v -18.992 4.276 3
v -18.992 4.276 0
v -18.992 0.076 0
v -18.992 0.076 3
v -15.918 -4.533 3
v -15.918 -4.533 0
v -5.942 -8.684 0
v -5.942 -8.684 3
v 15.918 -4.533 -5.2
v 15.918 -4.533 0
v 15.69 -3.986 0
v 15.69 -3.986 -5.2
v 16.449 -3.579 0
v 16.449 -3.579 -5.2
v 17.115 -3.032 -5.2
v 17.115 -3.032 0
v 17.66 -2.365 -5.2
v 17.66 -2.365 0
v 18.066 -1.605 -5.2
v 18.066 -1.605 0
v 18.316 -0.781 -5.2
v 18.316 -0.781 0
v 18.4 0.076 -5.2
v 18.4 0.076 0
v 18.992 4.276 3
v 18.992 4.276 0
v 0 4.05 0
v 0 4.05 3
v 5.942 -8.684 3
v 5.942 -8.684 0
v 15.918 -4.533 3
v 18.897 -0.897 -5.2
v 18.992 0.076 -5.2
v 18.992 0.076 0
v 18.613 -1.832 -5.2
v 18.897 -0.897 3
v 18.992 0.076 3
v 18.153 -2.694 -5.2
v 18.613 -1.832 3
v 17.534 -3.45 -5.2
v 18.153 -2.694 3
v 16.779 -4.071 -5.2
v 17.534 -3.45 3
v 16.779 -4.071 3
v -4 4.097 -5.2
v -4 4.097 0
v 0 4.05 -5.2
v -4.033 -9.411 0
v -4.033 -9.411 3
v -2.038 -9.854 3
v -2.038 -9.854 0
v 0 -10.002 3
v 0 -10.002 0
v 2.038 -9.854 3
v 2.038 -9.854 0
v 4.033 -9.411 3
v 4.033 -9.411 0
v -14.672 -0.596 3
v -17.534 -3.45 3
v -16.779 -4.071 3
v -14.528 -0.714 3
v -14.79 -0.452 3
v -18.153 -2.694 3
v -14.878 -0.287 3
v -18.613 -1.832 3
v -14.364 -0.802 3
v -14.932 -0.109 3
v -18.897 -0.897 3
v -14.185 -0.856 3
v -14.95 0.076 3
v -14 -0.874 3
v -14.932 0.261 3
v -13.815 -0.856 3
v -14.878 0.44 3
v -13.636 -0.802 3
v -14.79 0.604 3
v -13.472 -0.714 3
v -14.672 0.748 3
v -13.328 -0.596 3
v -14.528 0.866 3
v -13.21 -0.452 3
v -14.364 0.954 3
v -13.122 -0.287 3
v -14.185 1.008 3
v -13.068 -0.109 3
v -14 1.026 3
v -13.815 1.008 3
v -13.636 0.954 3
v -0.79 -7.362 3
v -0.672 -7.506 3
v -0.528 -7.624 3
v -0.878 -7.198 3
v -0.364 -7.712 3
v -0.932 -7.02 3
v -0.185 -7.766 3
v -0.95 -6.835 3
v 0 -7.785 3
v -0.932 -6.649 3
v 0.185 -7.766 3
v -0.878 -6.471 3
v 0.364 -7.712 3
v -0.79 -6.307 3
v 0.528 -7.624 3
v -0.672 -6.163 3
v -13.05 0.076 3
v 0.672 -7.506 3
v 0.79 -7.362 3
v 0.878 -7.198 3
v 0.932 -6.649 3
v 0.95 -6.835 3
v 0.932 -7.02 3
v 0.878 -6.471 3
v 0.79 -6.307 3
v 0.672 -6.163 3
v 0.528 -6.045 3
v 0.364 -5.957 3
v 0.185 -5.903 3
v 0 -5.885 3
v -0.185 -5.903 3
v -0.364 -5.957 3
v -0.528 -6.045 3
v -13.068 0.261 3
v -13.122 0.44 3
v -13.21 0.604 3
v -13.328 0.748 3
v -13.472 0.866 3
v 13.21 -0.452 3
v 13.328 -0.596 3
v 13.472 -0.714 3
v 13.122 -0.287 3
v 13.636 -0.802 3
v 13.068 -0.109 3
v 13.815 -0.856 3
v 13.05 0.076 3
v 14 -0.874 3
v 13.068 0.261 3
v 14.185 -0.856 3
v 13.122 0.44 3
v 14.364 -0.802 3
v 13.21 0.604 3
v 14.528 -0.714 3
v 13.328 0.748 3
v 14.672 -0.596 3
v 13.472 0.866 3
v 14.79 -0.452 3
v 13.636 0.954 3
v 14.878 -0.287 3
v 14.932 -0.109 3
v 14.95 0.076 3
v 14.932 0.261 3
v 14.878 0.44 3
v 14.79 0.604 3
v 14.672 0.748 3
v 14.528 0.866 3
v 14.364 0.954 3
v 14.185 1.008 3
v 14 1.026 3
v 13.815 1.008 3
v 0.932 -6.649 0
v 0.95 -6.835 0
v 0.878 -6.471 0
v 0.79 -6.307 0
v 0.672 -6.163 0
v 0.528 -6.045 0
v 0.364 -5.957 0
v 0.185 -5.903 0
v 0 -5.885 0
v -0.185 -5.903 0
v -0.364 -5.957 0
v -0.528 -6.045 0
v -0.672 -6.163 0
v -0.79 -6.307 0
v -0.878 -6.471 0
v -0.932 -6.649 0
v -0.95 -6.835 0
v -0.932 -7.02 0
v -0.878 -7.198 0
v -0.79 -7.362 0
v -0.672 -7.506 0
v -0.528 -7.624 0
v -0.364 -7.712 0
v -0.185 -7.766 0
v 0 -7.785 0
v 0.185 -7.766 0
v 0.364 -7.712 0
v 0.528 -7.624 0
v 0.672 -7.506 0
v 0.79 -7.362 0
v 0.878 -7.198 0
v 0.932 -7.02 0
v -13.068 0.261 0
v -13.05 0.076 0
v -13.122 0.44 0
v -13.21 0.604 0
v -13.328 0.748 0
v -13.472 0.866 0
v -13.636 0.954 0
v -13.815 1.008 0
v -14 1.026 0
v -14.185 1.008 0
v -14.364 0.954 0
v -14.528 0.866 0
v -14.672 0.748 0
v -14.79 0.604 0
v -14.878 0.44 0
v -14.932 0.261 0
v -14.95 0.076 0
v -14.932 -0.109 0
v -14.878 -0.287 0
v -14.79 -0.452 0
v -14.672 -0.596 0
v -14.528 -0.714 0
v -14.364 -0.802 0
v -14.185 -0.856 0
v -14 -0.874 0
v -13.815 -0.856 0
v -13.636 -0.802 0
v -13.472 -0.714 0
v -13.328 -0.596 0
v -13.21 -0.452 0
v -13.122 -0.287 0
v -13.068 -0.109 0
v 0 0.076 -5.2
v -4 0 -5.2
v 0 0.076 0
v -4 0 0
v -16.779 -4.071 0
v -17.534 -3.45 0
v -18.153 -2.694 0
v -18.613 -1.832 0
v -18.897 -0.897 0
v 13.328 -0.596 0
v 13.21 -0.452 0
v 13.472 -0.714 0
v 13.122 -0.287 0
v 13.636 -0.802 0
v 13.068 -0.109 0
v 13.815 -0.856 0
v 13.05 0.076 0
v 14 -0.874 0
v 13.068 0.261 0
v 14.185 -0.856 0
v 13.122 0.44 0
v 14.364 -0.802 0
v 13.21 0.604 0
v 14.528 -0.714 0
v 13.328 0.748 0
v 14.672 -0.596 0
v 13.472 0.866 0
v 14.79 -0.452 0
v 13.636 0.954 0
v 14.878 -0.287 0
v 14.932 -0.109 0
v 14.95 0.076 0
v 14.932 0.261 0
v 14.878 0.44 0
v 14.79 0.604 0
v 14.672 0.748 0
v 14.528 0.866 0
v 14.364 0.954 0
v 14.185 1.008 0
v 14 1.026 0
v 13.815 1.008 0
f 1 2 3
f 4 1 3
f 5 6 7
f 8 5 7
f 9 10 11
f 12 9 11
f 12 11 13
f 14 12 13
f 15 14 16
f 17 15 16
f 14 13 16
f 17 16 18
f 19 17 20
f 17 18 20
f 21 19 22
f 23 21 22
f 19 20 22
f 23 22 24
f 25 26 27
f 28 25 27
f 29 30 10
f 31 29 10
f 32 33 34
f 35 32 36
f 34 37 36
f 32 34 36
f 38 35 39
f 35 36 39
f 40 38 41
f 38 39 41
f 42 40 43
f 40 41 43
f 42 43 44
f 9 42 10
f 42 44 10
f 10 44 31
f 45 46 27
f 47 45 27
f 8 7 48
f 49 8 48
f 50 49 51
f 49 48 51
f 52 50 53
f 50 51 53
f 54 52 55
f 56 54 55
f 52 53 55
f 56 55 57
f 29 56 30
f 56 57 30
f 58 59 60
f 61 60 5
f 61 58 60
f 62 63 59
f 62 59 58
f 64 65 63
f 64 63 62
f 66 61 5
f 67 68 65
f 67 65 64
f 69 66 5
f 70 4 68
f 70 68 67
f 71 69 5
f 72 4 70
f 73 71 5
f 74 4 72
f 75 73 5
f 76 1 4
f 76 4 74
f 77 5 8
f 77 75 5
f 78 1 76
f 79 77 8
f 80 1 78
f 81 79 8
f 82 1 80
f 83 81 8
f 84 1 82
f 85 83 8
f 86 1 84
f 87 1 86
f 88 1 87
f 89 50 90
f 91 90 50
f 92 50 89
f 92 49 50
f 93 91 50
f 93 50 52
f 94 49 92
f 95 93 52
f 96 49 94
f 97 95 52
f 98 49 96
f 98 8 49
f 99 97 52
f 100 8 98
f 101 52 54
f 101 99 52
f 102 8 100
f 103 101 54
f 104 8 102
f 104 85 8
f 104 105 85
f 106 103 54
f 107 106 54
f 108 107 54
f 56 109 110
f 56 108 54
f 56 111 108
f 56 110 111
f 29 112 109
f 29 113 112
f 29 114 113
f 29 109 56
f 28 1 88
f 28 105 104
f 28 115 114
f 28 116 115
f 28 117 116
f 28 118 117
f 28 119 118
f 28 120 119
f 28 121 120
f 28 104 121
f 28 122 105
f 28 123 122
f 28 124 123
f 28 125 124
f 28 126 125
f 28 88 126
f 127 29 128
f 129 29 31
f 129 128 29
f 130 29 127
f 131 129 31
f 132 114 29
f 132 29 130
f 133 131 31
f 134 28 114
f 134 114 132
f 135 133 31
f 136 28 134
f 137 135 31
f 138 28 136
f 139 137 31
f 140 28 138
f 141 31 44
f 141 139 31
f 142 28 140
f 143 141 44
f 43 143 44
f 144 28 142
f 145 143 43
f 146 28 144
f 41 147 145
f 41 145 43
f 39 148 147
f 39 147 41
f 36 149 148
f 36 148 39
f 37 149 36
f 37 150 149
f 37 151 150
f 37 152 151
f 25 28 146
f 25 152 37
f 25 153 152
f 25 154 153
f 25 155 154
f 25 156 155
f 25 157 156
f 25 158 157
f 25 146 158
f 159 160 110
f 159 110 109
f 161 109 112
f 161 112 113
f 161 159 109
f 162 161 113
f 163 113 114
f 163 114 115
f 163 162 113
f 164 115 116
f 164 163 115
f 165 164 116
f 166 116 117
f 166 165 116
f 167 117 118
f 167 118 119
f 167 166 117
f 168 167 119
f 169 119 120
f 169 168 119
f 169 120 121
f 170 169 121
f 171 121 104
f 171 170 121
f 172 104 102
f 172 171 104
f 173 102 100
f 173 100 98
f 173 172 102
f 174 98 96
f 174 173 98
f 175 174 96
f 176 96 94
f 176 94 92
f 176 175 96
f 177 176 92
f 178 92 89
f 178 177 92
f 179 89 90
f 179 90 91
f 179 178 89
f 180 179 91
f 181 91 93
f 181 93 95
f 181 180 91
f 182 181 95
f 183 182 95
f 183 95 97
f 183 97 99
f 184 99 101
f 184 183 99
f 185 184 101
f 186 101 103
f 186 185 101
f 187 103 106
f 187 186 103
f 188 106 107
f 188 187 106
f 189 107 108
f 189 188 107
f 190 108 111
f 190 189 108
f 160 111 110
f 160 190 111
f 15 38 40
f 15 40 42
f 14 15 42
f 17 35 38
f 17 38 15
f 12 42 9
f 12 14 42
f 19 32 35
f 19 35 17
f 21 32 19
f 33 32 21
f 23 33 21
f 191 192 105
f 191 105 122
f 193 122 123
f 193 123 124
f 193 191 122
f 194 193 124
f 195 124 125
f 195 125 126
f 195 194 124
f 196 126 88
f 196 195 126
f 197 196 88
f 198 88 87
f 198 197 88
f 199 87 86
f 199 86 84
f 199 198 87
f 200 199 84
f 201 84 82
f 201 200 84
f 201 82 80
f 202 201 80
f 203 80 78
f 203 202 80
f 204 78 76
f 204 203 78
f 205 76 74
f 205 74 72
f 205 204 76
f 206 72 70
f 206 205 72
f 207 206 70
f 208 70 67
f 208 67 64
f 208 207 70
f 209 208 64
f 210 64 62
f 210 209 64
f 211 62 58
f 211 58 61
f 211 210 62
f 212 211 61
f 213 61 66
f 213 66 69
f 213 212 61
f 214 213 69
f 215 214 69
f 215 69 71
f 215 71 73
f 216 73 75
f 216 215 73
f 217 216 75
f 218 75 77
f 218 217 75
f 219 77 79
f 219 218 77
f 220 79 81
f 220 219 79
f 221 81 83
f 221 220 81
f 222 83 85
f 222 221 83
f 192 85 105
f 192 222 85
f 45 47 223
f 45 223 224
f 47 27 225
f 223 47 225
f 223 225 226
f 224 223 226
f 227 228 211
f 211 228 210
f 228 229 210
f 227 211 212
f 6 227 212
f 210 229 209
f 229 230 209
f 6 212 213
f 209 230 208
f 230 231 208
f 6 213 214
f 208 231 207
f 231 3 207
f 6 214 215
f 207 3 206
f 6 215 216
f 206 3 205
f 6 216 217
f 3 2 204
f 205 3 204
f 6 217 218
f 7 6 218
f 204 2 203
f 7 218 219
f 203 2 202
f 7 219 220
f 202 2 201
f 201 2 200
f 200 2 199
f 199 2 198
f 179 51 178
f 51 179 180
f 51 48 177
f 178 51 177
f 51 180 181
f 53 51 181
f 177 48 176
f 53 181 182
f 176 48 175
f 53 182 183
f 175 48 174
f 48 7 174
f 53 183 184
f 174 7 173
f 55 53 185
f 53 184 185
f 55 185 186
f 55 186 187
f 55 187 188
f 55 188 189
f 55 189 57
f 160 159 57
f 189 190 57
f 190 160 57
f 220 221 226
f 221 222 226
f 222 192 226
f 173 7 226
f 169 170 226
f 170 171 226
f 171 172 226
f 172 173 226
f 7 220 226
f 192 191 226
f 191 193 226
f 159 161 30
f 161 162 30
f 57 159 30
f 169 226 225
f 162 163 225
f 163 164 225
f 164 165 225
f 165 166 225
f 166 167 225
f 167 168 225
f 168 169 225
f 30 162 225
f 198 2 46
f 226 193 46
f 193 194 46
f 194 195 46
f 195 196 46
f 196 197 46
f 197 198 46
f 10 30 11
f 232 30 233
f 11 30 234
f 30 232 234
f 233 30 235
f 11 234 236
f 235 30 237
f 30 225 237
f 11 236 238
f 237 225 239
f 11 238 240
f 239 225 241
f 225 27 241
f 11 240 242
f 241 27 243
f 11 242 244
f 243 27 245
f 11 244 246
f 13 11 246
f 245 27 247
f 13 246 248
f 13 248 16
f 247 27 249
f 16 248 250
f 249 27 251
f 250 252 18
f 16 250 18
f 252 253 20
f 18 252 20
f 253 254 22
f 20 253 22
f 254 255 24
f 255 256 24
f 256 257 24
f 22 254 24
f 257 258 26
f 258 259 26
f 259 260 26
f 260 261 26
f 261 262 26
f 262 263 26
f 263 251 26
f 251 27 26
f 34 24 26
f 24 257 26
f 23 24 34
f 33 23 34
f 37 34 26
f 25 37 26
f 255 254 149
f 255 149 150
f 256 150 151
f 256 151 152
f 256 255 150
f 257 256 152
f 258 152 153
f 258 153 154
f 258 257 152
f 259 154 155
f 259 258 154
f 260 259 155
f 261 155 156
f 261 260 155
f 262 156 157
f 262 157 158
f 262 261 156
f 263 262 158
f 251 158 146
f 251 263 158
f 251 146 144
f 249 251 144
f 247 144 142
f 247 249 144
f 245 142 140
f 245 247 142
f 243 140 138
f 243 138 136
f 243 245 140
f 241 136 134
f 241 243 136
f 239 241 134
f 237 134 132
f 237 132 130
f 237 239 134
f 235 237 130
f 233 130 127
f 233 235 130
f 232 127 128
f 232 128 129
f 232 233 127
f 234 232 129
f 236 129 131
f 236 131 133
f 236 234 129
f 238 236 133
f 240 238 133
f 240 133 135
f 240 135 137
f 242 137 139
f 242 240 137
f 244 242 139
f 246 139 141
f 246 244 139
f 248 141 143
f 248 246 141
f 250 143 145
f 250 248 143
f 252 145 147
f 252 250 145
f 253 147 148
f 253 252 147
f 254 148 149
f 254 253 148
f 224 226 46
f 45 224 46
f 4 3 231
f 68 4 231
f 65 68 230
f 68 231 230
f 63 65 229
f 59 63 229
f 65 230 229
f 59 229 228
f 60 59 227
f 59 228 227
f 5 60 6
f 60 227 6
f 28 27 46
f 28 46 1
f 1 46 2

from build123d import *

# Parameters (mm, degrees)
SKETCH_1_R      = 0.95
EXTRUDE_1_DEPTH = 3
EXTRUDE_2_DEPTH = 5.2


with BuildPart() as part:
    # 草图1 → 凸台-拉伸1 (new body)
    with BuildSketch(Plane.XY):
        with BuildLine():
            Line((5.942462138, -8.684131796), (15.917990129, -4.533184225))
            ThreePointArc((15.917990129, -4.533184225), (18.153297697, -2.694164403), (18.992427879, 0.076116155))
            Line((18.992427879, 0.076116155), (18.992427879, 4.276025841))
            Line((18.992427879, 4.276025841), (0, 4.049500215))
            Line((0, 4.049500215), (-18.992427879, 4.276025841))
            Line((-18.992427879, 4.276025841), (-18.992427879, 0.076116155))
            ThreePointArc((-18.992427879, 0.076116155), (-18.153297697, -2.694164403), (-15.917990129, -4.533184225))
            Line((-15.917990129, -4.533184225), (-5.942462138, -8.684131796))
            ThreePointArc((-5.942462138, -8.684131796), (0, -10.002483291), (5.942462138, -8.684131796))
        make_face()
        with Locations((-14, 0.076116155)):
            Circle(SKETCH_1_R, mode=Mode.SUBTRACT)
        with Locations((14, 0.076116155)):
            Circle(SKETCH_1_R, mode=Mode.SUBTRACT)
        with Locations((0, -6.834517122)):
            Circle(SKETCH_1_R, mode=Mode.SUBTRACT)
    extrude(amount=EXTRUDE_1_DEPTH)

    # 草图2 → 凸台-拉伸2 (add)
    with BuildSketch(Plane(origin=(0, 0, 0), x_dir=(-1, 0, 0), z_dir=(0, 0, -1))):
        with BuildLine():
            ThreePointArc((-18.992427879, 0.076116155), (-18.153297697, -2.694164403), (-15.917990129, -4.533184225))
            Line((-15.917990129, -4.533184225), (-15.690391283, -3.98622028))
            ThreePointArc((-15.690391283, -3.98622028), (-17.66044544, -2.36542827), (-18.4, 0.076116155))
            Line((-18.4, 0.076116155), (-18.992427879, 0.076116155))
        make_face()
        Polygon((3.999715516, 4.097205441), (0, 4.049500215), (0, 0.076116155), (3.999715516, 0), align=None)
    extrude(amount=EXTRUDE_2_DEPTH)


solid = part.part
